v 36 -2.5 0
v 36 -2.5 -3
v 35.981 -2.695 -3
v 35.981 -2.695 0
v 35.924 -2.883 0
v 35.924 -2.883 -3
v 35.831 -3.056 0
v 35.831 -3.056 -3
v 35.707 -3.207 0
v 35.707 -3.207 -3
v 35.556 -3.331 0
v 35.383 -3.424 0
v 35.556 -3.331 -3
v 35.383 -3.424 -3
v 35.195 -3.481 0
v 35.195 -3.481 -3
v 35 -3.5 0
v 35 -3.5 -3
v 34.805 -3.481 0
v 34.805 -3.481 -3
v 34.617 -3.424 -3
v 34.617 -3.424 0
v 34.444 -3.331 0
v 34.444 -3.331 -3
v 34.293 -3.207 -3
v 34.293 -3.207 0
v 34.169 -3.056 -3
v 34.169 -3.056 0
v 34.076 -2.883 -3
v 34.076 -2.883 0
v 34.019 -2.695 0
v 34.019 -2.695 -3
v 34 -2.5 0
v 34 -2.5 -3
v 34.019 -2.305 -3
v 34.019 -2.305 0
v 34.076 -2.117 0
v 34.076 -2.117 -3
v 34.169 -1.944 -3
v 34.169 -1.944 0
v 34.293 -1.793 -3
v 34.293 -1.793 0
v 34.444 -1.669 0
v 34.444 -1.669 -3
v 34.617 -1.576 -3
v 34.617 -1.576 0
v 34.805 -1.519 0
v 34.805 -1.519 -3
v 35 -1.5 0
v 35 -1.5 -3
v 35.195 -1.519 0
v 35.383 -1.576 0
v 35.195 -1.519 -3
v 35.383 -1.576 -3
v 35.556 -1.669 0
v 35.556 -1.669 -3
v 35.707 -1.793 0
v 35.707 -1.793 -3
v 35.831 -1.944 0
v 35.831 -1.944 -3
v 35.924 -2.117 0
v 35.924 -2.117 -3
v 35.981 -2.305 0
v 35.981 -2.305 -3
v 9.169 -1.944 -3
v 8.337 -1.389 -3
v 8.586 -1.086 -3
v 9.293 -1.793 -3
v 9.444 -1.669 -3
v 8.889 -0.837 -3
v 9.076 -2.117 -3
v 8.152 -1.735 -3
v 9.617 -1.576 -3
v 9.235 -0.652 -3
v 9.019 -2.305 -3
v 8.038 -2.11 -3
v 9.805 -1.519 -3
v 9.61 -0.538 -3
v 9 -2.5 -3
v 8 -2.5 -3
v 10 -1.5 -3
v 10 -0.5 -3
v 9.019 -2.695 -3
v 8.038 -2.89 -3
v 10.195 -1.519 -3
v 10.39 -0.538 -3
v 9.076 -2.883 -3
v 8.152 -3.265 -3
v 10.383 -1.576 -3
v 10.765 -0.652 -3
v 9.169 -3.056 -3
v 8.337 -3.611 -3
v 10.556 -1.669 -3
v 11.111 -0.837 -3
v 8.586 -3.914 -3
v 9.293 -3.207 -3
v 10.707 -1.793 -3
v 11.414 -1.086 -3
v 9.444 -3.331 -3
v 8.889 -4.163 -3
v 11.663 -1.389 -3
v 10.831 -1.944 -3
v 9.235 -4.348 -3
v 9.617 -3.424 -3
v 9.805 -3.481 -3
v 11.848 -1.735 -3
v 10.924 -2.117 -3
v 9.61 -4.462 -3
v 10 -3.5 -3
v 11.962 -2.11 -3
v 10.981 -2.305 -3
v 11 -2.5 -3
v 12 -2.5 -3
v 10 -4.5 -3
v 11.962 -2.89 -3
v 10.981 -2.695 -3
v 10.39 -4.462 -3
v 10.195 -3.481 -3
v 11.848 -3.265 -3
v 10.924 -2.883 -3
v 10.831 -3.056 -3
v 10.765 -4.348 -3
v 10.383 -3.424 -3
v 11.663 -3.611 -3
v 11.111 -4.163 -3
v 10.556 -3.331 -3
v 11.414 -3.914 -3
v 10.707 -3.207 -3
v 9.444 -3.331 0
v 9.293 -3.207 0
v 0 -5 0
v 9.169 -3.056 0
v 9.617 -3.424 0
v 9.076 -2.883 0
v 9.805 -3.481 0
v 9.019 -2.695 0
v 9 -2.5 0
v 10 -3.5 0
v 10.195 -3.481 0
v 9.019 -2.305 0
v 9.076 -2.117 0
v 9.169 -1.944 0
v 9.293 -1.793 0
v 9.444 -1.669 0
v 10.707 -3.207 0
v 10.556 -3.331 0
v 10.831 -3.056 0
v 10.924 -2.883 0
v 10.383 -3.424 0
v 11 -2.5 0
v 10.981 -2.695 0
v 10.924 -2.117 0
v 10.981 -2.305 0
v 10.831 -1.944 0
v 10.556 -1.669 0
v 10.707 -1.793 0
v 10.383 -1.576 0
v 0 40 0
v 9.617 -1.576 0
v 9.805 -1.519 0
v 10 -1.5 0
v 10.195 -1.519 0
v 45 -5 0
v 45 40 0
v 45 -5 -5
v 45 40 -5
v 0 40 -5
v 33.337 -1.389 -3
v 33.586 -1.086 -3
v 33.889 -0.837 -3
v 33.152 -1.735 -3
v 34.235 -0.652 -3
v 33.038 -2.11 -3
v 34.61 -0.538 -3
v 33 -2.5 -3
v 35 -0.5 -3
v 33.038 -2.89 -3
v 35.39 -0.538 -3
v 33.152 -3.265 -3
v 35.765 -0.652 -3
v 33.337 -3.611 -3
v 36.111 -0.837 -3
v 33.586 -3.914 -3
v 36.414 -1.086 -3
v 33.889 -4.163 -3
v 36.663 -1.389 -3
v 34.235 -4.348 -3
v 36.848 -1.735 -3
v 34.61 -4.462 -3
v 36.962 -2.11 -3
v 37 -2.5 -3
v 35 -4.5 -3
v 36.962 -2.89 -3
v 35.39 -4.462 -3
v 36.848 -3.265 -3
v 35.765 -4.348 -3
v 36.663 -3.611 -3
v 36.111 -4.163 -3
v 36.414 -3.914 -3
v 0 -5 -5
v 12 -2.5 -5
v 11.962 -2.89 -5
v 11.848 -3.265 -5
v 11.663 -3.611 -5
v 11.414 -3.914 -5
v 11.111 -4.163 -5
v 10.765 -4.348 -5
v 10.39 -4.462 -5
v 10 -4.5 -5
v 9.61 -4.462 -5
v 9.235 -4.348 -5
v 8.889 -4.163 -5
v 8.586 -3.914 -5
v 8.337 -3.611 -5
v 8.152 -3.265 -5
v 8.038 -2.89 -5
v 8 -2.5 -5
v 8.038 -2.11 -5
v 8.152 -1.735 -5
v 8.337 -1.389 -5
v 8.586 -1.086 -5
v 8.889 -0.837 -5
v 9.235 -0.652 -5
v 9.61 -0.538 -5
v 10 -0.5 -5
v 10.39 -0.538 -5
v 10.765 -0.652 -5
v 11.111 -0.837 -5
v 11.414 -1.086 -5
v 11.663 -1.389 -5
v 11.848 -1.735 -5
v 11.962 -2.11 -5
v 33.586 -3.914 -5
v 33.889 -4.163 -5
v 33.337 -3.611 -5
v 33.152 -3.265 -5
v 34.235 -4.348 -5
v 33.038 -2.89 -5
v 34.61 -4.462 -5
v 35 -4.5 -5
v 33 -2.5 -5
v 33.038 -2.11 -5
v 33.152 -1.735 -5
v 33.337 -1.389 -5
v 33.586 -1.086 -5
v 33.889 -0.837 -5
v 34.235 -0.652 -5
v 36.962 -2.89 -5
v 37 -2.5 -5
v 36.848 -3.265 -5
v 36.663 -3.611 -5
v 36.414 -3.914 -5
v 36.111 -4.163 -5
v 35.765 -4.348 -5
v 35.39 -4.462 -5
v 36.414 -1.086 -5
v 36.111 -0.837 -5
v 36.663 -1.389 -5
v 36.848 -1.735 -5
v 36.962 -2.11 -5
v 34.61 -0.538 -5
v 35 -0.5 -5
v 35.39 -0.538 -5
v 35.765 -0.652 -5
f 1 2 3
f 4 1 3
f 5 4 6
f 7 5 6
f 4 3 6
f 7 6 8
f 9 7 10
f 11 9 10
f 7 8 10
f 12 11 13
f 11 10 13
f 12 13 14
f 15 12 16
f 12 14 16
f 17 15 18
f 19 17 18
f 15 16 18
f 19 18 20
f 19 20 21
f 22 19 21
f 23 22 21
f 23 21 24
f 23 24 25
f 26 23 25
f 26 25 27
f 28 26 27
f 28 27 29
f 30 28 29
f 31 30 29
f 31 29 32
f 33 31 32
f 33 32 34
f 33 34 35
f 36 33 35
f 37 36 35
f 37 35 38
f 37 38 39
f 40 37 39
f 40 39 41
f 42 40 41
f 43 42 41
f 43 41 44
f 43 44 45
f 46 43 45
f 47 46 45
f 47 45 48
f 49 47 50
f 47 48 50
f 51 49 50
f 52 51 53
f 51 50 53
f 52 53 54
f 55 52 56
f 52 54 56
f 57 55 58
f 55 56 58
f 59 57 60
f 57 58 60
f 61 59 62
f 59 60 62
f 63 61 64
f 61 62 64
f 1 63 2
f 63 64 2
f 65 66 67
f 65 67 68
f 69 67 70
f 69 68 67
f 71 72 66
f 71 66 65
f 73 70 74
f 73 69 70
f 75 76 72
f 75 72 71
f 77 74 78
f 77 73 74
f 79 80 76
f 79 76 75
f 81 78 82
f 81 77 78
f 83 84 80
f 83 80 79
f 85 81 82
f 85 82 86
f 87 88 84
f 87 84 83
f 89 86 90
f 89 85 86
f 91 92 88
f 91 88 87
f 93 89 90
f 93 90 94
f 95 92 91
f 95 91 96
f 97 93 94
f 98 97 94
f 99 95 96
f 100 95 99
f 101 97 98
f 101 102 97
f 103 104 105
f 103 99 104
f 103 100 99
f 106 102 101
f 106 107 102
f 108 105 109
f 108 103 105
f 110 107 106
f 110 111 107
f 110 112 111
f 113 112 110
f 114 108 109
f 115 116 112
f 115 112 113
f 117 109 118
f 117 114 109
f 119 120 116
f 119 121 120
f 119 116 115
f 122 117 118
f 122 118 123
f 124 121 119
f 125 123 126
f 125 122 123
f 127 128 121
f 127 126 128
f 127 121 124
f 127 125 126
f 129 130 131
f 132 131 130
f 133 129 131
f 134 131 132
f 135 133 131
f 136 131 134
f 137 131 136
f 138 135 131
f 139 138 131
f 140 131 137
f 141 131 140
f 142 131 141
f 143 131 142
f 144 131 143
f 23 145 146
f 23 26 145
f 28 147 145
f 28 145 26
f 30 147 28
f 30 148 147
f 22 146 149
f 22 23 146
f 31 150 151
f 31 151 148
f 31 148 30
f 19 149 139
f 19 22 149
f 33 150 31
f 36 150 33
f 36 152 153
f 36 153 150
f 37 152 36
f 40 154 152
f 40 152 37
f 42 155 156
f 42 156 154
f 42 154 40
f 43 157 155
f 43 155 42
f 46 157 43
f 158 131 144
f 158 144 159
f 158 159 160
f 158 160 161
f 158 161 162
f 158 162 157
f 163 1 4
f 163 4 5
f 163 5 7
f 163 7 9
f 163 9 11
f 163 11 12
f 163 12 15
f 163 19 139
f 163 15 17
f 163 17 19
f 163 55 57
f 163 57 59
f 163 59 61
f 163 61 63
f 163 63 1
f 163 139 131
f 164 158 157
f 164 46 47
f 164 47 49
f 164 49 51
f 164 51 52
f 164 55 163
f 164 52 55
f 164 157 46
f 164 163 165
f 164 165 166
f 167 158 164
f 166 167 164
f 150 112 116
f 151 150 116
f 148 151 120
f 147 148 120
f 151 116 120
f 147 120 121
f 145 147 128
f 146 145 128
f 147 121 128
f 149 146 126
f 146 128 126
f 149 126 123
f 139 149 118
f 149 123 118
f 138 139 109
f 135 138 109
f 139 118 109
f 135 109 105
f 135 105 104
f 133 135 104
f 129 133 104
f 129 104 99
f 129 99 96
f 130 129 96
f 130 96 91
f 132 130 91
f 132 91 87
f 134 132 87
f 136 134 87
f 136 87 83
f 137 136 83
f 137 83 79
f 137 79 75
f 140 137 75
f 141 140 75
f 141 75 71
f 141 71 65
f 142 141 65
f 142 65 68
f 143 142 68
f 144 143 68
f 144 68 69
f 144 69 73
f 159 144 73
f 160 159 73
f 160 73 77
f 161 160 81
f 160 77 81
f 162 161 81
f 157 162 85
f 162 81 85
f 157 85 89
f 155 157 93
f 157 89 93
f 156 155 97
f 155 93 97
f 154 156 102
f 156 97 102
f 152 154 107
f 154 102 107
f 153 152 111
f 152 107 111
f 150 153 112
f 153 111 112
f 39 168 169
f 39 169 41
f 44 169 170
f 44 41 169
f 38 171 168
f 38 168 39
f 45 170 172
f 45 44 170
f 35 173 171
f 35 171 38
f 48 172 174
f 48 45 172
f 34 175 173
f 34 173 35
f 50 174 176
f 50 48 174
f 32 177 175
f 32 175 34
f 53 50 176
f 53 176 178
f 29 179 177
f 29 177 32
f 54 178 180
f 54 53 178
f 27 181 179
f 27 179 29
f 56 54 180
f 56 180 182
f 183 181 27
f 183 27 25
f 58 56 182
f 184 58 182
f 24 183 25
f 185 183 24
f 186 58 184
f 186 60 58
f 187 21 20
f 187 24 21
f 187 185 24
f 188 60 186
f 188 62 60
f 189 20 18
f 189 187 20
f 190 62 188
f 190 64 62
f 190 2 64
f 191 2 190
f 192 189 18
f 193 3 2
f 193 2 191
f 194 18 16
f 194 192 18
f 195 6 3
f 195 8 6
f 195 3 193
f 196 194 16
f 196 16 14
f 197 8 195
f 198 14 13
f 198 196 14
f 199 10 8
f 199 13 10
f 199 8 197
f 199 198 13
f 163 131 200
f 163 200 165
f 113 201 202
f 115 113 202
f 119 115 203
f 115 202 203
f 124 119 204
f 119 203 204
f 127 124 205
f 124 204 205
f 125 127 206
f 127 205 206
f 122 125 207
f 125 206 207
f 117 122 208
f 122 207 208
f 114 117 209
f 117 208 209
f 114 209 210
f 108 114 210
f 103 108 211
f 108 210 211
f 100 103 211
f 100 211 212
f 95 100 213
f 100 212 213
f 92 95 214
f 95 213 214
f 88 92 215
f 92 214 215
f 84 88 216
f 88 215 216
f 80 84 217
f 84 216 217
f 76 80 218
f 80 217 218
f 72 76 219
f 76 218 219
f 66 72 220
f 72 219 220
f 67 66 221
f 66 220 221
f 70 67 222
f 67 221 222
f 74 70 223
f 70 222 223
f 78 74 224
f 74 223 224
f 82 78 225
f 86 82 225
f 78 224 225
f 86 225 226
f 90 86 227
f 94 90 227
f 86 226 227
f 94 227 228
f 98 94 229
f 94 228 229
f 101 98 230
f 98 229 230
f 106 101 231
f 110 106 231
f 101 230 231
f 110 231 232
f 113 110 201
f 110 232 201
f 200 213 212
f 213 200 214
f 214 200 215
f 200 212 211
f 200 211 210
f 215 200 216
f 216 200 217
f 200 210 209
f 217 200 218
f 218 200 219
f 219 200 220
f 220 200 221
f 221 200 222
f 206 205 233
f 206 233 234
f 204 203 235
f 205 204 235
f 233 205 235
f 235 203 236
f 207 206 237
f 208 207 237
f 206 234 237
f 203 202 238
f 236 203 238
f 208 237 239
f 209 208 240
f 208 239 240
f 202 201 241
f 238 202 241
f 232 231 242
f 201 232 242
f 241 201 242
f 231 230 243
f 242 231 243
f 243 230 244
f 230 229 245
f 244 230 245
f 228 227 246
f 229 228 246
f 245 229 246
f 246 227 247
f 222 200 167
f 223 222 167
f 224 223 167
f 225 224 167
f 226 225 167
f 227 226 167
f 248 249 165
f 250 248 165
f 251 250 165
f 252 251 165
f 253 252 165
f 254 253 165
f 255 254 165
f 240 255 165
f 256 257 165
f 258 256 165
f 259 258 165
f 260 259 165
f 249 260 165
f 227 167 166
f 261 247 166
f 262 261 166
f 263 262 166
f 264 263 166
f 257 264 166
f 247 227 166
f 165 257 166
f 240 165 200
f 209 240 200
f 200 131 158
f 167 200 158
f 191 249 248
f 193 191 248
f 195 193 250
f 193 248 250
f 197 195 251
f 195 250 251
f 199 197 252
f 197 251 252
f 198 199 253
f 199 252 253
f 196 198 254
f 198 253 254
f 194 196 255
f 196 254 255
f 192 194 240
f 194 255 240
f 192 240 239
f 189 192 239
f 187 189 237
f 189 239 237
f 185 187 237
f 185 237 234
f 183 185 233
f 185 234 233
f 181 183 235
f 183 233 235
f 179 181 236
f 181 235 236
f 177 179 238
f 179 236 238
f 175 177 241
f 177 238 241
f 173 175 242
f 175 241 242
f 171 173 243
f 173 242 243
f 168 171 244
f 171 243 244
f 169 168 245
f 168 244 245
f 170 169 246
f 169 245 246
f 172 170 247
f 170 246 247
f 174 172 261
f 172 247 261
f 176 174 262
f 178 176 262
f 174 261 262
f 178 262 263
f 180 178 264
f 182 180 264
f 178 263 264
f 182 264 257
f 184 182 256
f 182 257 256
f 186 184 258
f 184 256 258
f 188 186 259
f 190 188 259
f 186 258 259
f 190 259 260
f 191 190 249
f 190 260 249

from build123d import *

# Parameters (mm, degrees)
SKETCH010_W     = 45
SKETCH010_H     = 45
PAD002_DEPTH    = 5
SKETCH011_R     = 1
POCKET008_DEPTH = 5
SKETCH012_R     = 2
POCKET009_DEPTH = 2


with BuildPart() as part:
    # Sketch010 → Pad002 (new body)
    with BuildSketch(Plane.XY):
        with Locations((22.5, 17.5)):
            Rectangle(SKETCH010_W, SKETCH010_H)
    extrude(amount=-PAD002_DEPTH)

    # Sketch011 (on Face6 of Pad002) → Pocket008 (cut)
    with BuildSketch(Plane(origin=(0, 0, -5), x_dir=(1, 0, 0), z_dir=(0, 0, -1))):
        with Locations((10, 2.5)):
            Circle(SKETCH011_R)
        with Locations((35, 2.5)):
            Circle(SKETCH011_R)
    extrude(amount=-POCKET008_DEPTH, mode=Mode.SUBTRACT)

    # Sketch012 (on Face5 of Pocket008) → Pocket009 (cut)
    with BuildSketch(Plane(origin=(0, 0, -5), x_dir=(1, 0, 0), z_dir=(0, 0, -1))):
        with Locations((10, 2.5)):
            Circle(SKETCH012_R)
        with Locations((35, 2.5)):
            Circle(SKETCH012_R)
    extrude(amount=-POCKET009_DEPTH, mode=Mode.SUBTRACT)


solid = part.part
